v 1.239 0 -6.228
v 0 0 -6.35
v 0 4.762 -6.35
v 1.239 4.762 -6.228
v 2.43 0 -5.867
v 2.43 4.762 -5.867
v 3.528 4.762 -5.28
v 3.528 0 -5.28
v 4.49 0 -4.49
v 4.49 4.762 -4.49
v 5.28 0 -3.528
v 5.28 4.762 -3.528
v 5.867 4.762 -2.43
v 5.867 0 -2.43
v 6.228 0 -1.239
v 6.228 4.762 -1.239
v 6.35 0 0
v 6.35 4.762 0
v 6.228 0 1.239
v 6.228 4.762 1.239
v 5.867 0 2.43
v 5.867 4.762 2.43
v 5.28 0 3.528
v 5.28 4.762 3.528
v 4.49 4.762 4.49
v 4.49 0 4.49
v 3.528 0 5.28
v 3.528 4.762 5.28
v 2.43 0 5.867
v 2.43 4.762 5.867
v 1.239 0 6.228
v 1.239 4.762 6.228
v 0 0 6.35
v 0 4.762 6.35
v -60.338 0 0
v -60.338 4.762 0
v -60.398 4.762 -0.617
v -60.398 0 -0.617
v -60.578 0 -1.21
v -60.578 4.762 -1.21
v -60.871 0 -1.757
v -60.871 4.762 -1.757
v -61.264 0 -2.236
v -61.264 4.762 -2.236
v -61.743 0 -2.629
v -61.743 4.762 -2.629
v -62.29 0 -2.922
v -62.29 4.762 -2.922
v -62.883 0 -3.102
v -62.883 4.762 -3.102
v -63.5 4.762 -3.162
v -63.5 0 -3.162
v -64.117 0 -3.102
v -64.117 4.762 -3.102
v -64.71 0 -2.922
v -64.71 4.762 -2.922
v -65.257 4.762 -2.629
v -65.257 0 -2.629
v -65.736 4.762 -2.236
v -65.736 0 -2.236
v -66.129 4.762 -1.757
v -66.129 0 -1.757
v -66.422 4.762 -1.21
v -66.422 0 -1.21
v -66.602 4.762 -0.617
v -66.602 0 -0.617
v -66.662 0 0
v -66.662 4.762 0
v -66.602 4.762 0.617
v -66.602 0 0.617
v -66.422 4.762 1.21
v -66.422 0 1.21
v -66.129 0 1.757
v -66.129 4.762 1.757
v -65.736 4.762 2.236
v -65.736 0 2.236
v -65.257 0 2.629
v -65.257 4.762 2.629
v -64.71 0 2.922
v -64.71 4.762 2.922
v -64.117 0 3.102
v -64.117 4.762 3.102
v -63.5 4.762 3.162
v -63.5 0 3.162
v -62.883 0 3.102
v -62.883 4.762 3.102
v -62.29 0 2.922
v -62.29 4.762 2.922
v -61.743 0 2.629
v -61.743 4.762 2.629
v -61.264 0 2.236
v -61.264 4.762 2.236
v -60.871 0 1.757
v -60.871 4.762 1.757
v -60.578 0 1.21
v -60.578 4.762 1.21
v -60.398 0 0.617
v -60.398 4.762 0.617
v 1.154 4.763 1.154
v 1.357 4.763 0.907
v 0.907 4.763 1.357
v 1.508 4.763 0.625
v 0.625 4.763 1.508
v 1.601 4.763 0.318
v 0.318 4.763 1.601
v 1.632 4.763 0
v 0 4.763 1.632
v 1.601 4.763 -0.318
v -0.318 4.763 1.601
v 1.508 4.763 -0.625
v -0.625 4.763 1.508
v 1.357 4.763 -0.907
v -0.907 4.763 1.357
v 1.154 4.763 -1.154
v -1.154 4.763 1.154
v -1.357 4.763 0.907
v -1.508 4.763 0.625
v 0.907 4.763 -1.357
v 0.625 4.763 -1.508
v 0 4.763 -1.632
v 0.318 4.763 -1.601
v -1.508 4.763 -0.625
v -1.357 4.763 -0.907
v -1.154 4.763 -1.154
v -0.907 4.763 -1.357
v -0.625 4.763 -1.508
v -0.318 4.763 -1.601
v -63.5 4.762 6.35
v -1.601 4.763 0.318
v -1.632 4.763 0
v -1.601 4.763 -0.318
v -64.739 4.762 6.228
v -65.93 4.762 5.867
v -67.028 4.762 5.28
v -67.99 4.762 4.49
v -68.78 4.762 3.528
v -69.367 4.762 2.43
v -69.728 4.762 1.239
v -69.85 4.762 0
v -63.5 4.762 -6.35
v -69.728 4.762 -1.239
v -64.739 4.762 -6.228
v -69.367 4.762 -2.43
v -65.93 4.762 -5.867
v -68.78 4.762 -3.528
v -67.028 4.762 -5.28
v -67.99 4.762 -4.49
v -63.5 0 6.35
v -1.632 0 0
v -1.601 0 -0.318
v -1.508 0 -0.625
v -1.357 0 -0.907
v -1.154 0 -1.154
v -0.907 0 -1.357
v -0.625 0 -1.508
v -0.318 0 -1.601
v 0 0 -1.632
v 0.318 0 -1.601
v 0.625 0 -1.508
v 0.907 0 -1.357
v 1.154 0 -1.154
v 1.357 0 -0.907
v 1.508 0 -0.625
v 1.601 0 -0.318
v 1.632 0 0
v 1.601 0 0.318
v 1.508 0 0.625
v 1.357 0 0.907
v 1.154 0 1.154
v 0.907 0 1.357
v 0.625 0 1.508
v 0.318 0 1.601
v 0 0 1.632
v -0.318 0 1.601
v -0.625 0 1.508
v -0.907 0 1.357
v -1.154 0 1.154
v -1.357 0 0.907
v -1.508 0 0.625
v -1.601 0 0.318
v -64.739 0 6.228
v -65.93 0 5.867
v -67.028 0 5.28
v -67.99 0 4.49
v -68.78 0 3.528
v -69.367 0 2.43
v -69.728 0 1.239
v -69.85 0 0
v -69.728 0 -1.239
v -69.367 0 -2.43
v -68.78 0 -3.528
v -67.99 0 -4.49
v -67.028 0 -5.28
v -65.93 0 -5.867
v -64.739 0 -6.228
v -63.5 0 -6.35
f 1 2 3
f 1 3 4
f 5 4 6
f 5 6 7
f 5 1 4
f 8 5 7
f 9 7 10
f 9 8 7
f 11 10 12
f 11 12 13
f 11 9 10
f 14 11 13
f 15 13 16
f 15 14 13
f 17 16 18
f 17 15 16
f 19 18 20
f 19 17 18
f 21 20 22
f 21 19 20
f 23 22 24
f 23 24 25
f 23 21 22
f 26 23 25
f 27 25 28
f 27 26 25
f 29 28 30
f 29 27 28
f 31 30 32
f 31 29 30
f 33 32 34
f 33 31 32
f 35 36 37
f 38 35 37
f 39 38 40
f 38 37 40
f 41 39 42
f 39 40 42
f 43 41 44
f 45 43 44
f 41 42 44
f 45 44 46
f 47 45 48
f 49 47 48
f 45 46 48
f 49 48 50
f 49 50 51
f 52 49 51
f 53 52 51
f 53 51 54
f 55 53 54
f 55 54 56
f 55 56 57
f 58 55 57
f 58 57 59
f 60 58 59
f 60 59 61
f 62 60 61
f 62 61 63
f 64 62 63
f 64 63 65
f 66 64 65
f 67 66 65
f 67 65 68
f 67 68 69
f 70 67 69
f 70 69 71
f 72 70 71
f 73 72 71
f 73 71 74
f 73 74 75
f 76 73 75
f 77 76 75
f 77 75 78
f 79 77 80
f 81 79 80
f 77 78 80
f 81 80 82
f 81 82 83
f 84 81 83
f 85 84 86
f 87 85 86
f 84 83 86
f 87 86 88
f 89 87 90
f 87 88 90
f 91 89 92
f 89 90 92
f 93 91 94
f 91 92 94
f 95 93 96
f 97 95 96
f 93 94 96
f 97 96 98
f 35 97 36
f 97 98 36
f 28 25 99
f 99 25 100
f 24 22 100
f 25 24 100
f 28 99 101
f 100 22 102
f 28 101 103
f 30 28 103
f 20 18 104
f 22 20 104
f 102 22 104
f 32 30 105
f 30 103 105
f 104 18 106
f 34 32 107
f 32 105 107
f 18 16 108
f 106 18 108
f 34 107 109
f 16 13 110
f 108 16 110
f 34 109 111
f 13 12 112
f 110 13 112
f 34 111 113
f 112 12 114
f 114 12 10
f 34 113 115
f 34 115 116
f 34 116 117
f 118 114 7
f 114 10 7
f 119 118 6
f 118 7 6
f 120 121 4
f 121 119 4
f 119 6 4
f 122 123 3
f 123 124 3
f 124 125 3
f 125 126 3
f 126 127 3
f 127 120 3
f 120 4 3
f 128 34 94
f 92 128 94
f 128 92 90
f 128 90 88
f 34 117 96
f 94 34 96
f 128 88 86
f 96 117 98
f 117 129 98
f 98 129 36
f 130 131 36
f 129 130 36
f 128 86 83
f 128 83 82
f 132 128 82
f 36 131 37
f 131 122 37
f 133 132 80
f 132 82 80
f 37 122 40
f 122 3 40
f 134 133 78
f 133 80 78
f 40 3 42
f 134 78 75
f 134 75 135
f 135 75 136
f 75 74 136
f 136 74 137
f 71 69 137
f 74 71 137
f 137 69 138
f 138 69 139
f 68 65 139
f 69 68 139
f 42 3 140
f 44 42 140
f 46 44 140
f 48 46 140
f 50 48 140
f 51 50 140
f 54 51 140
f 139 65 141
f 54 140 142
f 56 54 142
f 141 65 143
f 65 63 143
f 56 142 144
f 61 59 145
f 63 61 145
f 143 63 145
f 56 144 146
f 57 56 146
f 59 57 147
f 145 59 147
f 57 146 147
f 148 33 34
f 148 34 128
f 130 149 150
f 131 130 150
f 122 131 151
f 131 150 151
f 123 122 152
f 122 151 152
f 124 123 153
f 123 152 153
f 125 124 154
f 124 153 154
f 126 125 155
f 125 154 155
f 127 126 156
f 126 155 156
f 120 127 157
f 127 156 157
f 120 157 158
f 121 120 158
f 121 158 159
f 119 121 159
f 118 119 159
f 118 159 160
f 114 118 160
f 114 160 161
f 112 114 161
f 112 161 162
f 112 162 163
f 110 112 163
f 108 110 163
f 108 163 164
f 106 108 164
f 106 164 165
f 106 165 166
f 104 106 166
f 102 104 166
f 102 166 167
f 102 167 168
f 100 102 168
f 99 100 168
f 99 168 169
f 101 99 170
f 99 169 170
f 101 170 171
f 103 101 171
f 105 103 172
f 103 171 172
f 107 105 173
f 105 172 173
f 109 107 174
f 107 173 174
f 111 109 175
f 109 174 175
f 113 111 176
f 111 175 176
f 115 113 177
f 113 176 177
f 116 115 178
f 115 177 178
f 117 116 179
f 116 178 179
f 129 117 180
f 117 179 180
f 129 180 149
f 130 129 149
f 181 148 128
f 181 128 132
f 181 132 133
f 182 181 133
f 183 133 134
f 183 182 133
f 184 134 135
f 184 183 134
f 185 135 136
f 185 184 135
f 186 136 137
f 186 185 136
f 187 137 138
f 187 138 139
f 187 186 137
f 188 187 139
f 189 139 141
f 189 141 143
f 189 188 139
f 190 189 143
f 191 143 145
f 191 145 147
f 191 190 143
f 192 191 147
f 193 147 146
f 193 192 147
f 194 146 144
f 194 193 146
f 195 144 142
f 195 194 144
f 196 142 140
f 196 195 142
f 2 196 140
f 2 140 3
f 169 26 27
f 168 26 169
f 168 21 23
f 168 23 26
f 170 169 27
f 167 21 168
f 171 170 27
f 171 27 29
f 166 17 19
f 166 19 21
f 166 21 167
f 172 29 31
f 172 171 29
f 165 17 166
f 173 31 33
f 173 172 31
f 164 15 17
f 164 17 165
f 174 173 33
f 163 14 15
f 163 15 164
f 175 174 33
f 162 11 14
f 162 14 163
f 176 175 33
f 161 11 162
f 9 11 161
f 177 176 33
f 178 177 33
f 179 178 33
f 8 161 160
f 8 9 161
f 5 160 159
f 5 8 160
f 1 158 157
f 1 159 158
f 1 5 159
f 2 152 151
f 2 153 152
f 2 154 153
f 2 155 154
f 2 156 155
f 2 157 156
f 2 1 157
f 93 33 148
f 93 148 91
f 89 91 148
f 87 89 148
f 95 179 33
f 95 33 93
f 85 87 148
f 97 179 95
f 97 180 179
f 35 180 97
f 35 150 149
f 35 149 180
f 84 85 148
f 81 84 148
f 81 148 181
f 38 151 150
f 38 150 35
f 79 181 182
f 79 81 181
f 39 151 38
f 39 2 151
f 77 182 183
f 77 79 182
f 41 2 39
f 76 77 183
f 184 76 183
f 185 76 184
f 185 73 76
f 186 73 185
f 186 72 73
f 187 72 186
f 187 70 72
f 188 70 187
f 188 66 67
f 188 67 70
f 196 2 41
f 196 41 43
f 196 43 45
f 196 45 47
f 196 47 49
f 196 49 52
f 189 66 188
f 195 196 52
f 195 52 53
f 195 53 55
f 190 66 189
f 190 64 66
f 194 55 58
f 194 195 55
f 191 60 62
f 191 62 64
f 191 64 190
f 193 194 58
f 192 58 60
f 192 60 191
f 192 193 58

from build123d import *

# Parameters (mm, degrees)
BOSS_EXTRUDE2_DEPTH   = 4.7625
F_4_CLEARANCE_HOLE1_D = 3.2639
SKETCH5_R             = 3.1623
CUT_EXTRUDE1_DEPTH    = 5.7625


with BuildPart() as part:
    # Sketch1 → Boss-Extrude2 (new body)
    with BuildSketch(Plane(origin=(0, 0, 0), x_dir=(1, 0, 0), z_dir=(0, 1, 0))):
        with BuildLine():
            Line((-63.5, 6.35), (0, 6.35))
            ThreePointArc((0, 6.35), (6.35, 0), (0, -6.35))
            Line((0, -6.35), (-63.5, -6.35))
            ThreePointArc((-63.5, -6.35), (-69.85, 0), (-63.5, 6.35))
        make_face()
    extrude(amount=BOSS_EXTRUDE2_DEPTH)

    # #4 Clearance Hole1 (through all)
    with Locations(Plane(origin=(0, 4.7625, 0), x_dir=(1, 0, 0), z_dir=(0, 1, 0))):
        with Locations((0, 0)):
            Hole(F_4_CLEARANCE_HOLE1_D / 2)

    # Sketch5 → Cut-Extrude1 (cut, through all)
    with BuildSketch(Plane(origin=(0, 4.7625, 0), x_dir=(1, 0, 0), z_dir=(0, 1, 0))):
        with Locations((-63.5, 0)):
            Circle(SKETCH5_R)
    extrude(amount=-CUT_EXTRUDE1_DEPTH, mode=Mode.SUBTRACT)


solid = part.part
